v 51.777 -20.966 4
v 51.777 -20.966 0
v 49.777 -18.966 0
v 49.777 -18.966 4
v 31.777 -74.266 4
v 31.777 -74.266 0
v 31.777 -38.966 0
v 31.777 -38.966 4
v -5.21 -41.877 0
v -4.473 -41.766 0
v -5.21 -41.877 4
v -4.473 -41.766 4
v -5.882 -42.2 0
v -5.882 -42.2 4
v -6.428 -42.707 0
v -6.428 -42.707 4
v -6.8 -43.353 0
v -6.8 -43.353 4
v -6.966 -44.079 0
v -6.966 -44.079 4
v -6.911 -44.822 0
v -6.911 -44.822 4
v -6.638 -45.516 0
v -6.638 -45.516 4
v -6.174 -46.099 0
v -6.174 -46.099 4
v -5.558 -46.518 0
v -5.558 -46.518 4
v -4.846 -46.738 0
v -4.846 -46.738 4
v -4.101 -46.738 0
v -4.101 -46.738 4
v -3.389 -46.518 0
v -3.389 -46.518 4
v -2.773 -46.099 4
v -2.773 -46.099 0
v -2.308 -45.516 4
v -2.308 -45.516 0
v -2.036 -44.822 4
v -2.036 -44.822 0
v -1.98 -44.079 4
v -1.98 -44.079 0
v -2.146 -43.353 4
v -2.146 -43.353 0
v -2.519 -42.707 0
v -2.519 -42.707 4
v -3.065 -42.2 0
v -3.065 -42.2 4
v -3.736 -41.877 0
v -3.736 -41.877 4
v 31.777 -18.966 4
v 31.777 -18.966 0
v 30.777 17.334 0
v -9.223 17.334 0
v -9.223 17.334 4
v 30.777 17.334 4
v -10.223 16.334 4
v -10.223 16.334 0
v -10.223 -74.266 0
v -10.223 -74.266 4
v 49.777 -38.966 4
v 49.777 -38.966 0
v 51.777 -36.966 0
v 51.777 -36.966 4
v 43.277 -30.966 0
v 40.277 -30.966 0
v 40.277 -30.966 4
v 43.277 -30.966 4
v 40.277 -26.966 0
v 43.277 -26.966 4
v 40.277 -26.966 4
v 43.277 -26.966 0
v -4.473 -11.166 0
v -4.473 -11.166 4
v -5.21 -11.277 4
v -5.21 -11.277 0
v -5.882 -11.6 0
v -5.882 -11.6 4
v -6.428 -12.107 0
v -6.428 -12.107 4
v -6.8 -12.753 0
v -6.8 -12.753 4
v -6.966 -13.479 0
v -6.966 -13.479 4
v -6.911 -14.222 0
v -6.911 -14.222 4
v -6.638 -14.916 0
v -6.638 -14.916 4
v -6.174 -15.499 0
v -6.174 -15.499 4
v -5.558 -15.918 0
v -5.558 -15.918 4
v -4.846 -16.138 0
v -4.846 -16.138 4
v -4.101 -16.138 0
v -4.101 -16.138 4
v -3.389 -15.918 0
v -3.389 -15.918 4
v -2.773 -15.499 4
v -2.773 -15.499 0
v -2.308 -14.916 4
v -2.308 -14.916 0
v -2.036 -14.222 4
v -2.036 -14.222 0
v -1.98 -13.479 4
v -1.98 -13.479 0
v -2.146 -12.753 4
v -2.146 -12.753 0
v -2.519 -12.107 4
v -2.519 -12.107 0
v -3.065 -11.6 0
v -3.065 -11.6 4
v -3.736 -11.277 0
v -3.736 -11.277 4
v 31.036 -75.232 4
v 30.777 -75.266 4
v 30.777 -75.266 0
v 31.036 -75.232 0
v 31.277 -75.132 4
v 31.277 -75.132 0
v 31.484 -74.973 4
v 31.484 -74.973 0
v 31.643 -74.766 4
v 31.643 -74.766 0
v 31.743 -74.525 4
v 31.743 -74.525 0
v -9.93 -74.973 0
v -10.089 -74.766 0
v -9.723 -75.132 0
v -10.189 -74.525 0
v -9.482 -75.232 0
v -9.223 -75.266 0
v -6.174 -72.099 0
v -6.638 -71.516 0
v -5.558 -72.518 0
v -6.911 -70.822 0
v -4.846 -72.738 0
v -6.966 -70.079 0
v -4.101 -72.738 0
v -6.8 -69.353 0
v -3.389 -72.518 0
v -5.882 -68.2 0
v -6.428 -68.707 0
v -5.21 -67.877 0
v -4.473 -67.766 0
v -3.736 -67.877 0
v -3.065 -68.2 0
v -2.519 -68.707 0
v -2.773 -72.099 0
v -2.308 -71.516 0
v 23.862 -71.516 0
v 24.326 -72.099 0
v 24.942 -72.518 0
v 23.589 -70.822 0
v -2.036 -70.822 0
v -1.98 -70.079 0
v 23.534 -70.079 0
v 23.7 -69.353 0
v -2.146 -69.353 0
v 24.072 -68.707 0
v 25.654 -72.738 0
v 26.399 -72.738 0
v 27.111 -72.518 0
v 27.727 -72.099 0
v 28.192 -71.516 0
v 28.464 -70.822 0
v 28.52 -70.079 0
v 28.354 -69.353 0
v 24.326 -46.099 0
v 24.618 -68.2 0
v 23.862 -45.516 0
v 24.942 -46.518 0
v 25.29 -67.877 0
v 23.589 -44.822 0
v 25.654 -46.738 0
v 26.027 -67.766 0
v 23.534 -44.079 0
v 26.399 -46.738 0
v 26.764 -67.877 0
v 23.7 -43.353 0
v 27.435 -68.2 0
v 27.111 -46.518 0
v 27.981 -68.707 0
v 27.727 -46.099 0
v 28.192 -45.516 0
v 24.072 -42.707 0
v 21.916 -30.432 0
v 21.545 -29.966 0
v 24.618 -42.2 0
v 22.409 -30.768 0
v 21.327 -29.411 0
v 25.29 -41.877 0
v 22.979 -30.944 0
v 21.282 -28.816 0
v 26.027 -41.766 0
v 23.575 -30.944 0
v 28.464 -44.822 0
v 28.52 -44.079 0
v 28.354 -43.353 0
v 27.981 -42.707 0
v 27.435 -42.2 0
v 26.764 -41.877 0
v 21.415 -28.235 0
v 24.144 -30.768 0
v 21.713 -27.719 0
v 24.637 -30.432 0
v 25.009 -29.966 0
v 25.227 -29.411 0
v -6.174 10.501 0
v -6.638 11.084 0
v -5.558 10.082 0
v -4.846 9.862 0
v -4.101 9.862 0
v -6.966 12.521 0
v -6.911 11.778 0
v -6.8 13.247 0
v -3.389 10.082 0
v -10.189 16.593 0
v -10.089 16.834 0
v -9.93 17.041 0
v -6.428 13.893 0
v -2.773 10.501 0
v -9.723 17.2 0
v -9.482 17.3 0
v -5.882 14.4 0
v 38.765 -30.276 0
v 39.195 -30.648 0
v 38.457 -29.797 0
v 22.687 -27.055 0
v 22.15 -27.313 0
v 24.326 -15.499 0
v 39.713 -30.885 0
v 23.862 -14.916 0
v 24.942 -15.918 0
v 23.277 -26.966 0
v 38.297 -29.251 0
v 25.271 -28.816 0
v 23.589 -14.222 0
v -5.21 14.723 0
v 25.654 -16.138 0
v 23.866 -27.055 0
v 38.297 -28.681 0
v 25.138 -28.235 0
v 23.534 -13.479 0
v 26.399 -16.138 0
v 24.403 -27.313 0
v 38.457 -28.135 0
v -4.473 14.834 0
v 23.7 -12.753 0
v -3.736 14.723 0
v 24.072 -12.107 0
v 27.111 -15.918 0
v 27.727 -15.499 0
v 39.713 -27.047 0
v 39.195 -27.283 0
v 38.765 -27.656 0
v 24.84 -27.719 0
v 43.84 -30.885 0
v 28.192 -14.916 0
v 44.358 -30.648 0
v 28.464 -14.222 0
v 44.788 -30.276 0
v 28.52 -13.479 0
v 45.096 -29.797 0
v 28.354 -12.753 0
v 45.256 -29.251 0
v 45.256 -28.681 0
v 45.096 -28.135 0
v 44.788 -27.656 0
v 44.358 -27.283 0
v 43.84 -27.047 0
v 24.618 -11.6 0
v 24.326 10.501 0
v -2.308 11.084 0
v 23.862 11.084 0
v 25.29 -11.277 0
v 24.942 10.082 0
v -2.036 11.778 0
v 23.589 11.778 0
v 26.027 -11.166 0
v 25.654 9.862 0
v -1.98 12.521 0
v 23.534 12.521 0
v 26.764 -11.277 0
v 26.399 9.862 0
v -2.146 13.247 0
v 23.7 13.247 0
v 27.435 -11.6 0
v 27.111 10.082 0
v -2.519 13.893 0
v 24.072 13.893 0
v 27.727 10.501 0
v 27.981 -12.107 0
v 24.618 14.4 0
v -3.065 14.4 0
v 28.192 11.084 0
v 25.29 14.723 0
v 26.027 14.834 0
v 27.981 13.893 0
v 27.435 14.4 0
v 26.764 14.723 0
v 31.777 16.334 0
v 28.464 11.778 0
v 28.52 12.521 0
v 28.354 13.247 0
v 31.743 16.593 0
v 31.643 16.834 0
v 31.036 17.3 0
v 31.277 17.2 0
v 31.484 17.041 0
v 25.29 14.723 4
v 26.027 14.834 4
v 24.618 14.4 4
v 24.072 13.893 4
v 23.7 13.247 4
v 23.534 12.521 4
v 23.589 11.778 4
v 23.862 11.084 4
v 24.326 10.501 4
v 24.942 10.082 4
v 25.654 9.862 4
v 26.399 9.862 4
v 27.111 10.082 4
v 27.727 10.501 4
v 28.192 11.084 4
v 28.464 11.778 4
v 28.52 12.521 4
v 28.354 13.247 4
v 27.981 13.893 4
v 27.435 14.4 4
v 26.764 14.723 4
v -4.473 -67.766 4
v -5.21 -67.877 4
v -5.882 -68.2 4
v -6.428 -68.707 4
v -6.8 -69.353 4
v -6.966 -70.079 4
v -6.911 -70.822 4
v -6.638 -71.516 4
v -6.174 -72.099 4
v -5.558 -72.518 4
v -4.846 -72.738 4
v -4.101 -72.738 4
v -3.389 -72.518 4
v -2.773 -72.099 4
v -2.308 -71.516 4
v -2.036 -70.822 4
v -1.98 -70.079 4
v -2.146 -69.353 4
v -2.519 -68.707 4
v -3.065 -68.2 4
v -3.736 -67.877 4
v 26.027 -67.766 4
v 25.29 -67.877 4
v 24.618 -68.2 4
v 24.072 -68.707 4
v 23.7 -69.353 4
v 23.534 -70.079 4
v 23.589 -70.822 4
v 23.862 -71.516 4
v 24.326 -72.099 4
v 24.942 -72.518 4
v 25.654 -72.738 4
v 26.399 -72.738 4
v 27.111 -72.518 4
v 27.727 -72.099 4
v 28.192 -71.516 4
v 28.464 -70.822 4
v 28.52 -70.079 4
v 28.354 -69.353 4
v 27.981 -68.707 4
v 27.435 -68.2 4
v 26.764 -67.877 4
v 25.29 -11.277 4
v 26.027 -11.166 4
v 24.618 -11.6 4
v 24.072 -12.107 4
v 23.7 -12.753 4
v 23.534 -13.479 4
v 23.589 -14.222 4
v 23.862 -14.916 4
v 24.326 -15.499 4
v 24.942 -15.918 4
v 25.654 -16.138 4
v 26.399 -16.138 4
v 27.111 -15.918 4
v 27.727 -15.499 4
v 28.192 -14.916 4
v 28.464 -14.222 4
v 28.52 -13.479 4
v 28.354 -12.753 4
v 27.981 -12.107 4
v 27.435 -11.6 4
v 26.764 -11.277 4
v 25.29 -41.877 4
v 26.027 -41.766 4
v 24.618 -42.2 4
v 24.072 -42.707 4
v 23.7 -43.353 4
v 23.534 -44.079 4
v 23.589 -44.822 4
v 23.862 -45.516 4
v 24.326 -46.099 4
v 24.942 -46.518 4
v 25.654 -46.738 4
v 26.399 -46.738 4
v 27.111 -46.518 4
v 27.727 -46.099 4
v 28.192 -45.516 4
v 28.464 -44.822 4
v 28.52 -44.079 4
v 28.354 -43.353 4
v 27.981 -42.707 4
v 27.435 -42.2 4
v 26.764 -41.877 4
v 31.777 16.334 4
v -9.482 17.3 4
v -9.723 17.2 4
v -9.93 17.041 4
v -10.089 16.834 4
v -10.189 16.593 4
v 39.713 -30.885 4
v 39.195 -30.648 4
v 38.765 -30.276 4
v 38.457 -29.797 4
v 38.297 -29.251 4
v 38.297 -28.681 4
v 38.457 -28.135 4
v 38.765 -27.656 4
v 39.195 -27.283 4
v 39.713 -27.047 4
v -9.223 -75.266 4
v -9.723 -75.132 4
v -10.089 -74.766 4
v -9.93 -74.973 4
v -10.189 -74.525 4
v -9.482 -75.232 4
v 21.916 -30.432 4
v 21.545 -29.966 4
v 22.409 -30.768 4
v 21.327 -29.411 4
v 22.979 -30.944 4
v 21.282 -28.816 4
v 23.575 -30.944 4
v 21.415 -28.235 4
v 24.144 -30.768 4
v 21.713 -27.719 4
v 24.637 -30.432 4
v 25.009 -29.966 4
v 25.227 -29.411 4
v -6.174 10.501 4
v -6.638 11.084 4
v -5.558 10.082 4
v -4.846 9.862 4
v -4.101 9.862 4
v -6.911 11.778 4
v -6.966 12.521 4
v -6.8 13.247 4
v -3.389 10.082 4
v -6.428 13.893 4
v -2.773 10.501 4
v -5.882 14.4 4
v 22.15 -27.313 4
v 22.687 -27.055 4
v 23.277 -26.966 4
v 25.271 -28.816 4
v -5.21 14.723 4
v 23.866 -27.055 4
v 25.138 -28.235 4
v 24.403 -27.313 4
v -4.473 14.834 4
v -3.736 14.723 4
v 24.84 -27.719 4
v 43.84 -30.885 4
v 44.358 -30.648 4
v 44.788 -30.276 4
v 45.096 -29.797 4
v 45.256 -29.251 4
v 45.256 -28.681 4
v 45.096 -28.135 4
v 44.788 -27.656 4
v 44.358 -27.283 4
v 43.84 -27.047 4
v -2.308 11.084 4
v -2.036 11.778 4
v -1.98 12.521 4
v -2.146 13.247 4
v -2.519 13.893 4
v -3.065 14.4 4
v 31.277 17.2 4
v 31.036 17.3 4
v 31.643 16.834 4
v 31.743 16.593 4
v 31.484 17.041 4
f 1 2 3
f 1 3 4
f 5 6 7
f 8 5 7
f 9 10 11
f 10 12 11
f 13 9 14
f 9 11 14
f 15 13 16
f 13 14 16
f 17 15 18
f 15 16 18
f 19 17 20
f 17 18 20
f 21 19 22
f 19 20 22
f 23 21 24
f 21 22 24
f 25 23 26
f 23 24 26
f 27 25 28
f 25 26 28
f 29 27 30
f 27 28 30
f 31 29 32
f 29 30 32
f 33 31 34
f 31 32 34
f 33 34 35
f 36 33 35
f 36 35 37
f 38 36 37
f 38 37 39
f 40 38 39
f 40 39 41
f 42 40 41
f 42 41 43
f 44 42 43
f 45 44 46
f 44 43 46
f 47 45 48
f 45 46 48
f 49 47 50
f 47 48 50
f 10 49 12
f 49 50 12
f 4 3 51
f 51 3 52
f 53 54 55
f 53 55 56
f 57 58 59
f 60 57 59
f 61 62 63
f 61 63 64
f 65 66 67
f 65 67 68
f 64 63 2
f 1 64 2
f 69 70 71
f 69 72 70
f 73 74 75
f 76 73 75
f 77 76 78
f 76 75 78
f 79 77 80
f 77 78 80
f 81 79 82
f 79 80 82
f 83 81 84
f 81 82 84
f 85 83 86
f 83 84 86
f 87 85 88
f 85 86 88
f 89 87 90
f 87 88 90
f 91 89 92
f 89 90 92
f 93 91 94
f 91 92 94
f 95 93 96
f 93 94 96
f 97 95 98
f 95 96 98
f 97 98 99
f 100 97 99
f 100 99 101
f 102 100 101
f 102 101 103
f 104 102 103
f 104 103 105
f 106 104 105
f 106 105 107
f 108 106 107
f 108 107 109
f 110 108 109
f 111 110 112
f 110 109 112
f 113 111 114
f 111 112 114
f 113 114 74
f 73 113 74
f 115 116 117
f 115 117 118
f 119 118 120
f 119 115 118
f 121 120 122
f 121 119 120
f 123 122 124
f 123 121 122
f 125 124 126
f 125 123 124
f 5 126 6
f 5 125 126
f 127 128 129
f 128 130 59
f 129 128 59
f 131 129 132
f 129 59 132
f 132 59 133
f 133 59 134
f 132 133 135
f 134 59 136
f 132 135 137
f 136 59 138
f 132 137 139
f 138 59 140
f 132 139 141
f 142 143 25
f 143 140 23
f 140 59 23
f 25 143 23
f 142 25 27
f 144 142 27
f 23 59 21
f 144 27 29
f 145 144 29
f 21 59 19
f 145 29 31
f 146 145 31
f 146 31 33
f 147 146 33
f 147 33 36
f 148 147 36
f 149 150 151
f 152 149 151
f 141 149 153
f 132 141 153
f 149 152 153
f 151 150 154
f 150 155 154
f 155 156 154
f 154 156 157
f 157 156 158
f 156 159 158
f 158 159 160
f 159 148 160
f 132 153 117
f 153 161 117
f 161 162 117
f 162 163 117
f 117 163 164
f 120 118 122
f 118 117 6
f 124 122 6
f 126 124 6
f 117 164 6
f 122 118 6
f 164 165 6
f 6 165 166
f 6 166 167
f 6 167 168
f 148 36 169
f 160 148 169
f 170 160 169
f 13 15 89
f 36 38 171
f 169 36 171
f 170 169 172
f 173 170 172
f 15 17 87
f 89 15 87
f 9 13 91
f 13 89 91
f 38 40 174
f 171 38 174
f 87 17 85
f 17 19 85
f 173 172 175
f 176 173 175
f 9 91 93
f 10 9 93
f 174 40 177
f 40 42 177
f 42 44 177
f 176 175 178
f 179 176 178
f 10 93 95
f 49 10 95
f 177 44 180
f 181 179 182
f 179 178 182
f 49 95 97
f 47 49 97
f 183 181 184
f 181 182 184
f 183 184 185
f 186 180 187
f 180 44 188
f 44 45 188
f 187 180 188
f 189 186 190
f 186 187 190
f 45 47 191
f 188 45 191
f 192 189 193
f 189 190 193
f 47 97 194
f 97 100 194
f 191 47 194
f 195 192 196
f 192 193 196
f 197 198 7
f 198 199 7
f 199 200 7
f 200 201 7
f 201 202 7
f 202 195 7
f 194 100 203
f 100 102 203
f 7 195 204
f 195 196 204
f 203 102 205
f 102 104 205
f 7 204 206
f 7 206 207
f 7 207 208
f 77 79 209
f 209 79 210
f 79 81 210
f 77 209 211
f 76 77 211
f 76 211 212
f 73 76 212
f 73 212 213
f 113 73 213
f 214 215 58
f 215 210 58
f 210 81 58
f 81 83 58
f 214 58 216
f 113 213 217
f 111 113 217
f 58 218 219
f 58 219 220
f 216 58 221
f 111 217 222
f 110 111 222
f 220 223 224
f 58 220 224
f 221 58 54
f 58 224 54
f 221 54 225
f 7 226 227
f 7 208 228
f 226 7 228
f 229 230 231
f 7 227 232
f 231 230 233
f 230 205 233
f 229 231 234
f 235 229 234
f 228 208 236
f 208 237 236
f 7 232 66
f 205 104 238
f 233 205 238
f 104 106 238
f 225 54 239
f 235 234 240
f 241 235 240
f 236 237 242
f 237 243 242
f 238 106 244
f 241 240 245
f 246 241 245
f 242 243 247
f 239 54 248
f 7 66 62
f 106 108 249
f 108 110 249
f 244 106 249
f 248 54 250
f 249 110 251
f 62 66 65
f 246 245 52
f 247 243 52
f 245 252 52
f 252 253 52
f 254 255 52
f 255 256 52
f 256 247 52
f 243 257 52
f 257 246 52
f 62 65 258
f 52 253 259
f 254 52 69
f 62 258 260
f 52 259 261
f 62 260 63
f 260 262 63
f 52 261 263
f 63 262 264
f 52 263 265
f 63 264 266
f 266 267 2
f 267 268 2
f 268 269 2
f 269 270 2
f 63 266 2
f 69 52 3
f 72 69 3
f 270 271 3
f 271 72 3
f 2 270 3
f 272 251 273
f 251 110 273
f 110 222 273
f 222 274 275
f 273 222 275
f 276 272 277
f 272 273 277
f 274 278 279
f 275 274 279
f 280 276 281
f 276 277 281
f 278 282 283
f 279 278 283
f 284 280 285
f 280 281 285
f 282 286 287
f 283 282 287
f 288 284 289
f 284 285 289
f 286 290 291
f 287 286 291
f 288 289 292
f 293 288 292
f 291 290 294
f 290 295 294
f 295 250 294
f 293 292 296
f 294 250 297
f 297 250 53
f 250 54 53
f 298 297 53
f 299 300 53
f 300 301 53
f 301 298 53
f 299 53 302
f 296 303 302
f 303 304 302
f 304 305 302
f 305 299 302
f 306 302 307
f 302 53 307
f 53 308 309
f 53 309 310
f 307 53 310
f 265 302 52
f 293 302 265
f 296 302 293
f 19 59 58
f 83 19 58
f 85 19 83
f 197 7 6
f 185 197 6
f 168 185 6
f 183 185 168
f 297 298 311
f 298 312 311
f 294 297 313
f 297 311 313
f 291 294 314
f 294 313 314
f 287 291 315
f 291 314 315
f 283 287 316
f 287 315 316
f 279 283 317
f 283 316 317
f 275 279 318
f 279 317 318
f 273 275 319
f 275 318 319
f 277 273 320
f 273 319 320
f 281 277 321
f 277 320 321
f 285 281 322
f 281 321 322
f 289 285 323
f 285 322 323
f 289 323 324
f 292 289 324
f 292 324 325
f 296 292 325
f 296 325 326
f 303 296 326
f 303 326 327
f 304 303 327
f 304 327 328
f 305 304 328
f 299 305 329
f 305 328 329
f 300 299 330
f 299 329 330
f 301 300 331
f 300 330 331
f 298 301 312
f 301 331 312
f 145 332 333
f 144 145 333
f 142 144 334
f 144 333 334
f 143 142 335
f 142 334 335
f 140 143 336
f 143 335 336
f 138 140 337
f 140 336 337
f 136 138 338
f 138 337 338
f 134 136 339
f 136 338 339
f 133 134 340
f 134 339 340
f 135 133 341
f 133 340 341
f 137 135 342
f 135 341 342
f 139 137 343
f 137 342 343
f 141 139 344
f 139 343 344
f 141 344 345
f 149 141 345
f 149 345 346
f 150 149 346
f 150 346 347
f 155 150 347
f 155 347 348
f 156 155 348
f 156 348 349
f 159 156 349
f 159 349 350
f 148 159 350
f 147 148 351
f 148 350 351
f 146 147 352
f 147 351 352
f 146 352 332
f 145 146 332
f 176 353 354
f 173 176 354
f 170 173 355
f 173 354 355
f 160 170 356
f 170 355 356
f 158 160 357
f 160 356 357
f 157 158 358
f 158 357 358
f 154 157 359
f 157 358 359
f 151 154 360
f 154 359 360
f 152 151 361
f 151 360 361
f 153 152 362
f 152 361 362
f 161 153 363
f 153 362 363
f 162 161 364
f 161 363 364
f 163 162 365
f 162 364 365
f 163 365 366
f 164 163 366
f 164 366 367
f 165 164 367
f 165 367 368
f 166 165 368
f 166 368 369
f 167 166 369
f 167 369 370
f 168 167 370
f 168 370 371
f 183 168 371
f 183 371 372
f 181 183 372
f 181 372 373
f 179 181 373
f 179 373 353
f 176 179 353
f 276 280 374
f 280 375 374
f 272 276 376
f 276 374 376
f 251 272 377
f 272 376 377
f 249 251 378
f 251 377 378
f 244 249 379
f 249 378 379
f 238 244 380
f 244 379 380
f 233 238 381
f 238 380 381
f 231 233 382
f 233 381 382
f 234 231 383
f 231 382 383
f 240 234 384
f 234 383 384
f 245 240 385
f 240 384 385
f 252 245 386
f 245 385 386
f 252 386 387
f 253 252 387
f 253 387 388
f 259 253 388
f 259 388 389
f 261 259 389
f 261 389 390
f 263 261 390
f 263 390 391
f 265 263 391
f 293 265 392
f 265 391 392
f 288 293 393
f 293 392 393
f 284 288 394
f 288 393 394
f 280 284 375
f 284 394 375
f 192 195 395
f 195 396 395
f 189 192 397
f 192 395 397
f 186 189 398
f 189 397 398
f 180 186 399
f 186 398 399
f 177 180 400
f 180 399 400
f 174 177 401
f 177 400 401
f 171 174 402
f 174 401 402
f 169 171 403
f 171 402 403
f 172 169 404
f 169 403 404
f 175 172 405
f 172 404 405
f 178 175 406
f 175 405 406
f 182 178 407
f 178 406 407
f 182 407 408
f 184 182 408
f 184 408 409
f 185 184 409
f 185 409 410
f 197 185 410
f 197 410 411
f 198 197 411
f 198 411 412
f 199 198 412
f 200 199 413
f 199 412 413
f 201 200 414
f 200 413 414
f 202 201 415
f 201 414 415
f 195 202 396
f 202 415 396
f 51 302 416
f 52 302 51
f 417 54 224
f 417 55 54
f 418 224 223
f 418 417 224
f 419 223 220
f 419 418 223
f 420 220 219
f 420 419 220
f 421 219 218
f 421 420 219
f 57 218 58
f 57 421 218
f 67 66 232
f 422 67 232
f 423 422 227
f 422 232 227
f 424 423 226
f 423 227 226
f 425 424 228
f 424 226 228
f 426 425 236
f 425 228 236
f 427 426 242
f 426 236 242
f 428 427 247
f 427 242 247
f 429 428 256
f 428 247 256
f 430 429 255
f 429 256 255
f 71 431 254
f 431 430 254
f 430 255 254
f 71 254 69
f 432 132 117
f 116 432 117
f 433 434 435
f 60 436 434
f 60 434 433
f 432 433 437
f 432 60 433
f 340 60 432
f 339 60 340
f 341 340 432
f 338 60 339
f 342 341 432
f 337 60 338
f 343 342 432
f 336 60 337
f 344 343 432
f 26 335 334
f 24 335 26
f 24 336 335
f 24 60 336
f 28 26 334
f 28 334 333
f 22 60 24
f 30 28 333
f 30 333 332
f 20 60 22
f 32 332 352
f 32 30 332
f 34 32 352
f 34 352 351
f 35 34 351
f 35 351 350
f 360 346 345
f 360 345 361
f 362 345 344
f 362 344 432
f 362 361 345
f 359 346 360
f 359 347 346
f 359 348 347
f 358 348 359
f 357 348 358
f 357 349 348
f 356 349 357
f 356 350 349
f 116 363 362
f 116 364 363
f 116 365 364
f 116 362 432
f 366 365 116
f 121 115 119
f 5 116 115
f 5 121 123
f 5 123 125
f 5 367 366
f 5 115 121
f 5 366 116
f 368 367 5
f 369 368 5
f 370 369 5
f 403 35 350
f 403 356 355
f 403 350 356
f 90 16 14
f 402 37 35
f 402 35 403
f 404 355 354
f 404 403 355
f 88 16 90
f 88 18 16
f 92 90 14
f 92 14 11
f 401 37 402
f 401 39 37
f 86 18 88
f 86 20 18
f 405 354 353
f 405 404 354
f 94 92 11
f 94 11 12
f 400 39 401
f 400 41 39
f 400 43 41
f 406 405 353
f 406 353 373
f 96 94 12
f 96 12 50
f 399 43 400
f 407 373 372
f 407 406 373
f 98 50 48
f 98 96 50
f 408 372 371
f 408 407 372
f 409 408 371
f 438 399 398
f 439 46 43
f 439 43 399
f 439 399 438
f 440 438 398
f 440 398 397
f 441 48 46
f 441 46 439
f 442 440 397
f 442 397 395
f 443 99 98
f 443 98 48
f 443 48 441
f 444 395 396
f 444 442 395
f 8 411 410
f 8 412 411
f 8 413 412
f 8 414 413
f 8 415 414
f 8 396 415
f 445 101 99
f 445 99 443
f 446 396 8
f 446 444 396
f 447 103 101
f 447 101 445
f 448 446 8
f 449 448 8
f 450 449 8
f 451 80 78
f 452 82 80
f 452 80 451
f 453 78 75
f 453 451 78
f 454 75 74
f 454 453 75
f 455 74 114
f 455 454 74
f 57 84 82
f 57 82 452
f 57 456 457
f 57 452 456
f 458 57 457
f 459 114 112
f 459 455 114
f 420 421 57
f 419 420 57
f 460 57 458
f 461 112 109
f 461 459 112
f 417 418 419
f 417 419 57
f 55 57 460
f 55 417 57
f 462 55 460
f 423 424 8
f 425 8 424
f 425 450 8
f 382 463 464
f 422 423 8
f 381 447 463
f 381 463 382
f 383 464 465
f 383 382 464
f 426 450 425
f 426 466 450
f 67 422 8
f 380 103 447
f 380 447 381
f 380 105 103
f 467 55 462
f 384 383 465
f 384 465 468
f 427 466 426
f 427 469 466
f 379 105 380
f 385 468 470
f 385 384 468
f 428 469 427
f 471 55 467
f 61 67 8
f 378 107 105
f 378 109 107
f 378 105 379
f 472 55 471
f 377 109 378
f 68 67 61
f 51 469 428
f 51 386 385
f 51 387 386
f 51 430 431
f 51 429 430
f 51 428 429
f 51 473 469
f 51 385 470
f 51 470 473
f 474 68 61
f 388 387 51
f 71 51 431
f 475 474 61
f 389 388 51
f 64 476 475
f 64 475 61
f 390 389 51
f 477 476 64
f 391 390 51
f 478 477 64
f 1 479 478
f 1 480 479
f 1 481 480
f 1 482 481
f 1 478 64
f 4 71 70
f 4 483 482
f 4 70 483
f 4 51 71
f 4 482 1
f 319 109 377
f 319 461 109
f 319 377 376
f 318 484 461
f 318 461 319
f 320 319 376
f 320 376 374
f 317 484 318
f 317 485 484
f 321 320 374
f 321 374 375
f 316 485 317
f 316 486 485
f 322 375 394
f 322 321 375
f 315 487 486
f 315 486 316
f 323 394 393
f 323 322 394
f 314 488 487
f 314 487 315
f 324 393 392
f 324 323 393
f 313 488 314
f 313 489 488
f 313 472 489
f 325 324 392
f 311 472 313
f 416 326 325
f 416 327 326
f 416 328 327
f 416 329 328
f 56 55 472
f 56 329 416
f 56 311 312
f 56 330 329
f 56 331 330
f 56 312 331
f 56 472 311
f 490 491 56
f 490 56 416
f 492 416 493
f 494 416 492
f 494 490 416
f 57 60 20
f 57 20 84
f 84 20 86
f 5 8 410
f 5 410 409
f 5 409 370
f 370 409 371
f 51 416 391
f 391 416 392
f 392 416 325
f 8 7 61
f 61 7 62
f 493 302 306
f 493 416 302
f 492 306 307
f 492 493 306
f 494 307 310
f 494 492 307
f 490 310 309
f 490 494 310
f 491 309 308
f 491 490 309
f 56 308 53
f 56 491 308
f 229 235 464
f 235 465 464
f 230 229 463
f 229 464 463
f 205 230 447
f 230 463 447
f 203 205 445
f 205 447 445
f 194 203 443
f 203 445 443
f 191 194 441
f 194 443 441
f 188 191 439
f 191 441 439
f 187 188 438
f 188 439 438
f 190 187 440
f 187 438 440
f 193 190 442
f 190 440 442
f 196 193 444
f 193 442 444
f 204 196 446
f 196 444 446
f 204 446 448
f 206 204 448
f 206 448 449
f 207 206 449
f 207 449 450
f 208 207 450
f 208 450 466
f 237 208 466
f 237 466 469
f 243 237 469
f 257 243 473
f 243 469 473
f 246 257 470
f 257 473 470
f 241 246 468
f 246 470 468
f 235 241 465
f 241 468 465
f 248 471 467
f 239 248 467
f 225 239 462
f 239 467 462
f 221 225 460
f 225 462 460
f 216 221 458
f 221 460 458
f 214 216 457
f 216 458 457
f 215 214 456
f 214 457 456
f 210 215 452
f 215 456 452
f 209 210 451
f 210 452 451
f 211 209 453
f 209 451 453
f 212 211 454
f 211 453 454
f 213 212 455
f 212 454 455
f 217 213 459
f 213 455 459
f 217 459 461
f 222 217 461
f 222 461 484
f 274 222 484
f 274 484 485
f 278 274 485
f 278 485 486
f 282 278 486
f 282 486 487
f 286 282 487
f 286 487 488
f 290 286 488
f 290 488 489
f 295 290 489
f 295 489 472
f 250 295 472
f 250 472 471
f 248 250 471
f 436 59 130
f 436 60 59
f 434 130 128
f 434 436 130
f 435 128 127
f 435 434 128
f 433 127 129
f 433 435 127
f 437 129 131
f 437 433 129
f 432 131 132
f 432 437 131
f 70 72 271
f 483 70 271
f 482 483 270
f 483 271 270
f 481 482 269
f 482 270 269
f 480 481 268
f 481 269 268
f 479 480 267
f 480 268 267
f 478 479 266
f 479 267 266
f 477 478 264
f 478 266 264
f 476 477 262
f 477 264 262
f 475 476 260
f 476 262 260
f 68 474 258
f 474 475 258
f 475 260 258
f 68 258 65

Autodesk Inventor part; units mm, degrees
ref_plane "YZ Plane" through (0, 0, 0) normal (1, 0, 0) x (0, 1, 0)
ref_plane "XZ Plane" through (0, 0, 0) normal (0, 1, 0) x (-1, 0, 0)
ref_plane "XY Plane" through (0, 0, 0) normal (0, 0, 1) x (1, 0, 0)
sketch "Szkic1" plane through (0, 0, 0) normal (0, 0, 1) x (1, 0, 0)
  line L0 (-10.2233, 17.3341) -> (-10.2233, -75.2659)
  line L1 (-10.2233, -75.2659) -> (31.7767, -75.2659)
  line L2 (-10.2233, 17.3341) -> (31.7767, 17.3341)
  line L3 (31.7767, 17.3341) -> (31.7767, -18.9659)
  line L4 (31.7767, -75.2659) -> (31.7767, -38.9659)
  line L5 (31.7767, -38.9659) -> (51.7767, -38.9659)
  line L6 (51.7767, -38.9659) -> (51.7767, -18.9659)
  line L7 (51.7767, -18.9659) -> (31.7767, -18.9659)
  line L8 (43.2767, -28.9659) -> (40.2767, -28.9659) construction
  line L9 (43.2767, -26.9659) -> (40.2767, -26.9659)
  line L10 (40.2767, -30.9659) -> (43.2767, -30.9659)
  arc A0 (43.2767, -30.9659) -> (43.2767, -26.9659) centre (43.2767, -28.9659) ccw
  arc A1 (40.2767, -26.9659) -> (40.2767, -30.9659) centre (40.2767, -28.9659) ccw
  point P0 (0, 0)
  point P1 (-4.4733, 12.3341)
  point P2 (26.0267, 12.3341)
  point P3 (-4.4733, -13.6659)
  point P4 (26.0267, -13.6659)
  point P5 (-4.4733, -44.2659)
  point P6 (26.0267, -44.2659)
  point P7 (-4.4733, -70.2659)
  point P8 (26.0267, -70.2659)
  point P9 (41.7767, -28.9659)
  point P10 (23.2767, -28.9659)
  dimension "d0" = 92.6
  dimension "d1" = 42
  dimension "d2" = 20
  dimension "d3" = 20
  dimension "d4" = 36.3
  dimension "d39" = 5
  dimension "d40" = 5
  dimension "d41" = 5
  dimension "d42" = 5
  dimension "d43" = 5.75
  dimension "d44" = 5.75
  dimension "d45" = 42
  dimension "d46" = 5.75
  dimension "d47" = 5.75
  dimension "d48" = 5.75
  dimension "d49" = 5.75
  dimension "d50" = 36.3
  dimension "d51" = 5.75
  dimension "d52" = 5.75
  dimension "d60" = 26
  dimension "d61" = 26
  dimension "d62" = 26
  dimension "d63" = 26
  dimension "d65" = 10
  dimension "d66" = 10
  dimension "d74" = 1.5
  dimension "d75" = 4
  dimension "d76" = 33.5
  dimension "d77" = 10
extrude "Wyciągnięcie proste1" add sketch "Szkic1" along normal blind 4
chamfer "Faza1" distance 2 angle 45 2 edges at (51.7767, -18.9659, 2) (51.7767, -38.9659, 2)
hole "Otwór3" at (-4.4733, 12.3341, 0) at (26.0267, 12.3341, 0) at (-4.4733, -13.6659, 0) at (26.0267, -13.6659, 0) at (-4.4733, -44.2659, 0) at (26.0267, -44.2659, 0) at (-4.4733, -70.2659, 0) at (26.0267, -70.2659, 0) direction (0, 0, 1) diameter 5 end through all
fillet "Zaokrąglenie1" radius 1 4 edges at (31.7767, 17.3341, 2) (-10.2233, 17.3341, 2) (31.7767, -75.2659, 2) (-10.2233, -75.2659, 2)
hole "Otwór5" at (41.7767, -28.9659, 0) at (23.2767, -28.9659, 0) direction (0, 0, 1) diameter 4 end through all
equation "\"d4\" = -0.5 * d2 + 0.5 * d0"
equation "\"d39\" = d41"
equation "\"d40\" = d41"
equation "\"d42\" = d41"
equation "\"d44\" = d43"
equation "\"d45\" = d1"
equation "\"d46\" = d43"
equation "\"d47\" = d43"
equation "\"d48\" = d43"
equation "\"d49\" = d43"
equation "\"d51\" = d43"
equation "\"d52\" = d43"
properties part number "LC_ALU_4mm_X_End_Bearing_Side"
